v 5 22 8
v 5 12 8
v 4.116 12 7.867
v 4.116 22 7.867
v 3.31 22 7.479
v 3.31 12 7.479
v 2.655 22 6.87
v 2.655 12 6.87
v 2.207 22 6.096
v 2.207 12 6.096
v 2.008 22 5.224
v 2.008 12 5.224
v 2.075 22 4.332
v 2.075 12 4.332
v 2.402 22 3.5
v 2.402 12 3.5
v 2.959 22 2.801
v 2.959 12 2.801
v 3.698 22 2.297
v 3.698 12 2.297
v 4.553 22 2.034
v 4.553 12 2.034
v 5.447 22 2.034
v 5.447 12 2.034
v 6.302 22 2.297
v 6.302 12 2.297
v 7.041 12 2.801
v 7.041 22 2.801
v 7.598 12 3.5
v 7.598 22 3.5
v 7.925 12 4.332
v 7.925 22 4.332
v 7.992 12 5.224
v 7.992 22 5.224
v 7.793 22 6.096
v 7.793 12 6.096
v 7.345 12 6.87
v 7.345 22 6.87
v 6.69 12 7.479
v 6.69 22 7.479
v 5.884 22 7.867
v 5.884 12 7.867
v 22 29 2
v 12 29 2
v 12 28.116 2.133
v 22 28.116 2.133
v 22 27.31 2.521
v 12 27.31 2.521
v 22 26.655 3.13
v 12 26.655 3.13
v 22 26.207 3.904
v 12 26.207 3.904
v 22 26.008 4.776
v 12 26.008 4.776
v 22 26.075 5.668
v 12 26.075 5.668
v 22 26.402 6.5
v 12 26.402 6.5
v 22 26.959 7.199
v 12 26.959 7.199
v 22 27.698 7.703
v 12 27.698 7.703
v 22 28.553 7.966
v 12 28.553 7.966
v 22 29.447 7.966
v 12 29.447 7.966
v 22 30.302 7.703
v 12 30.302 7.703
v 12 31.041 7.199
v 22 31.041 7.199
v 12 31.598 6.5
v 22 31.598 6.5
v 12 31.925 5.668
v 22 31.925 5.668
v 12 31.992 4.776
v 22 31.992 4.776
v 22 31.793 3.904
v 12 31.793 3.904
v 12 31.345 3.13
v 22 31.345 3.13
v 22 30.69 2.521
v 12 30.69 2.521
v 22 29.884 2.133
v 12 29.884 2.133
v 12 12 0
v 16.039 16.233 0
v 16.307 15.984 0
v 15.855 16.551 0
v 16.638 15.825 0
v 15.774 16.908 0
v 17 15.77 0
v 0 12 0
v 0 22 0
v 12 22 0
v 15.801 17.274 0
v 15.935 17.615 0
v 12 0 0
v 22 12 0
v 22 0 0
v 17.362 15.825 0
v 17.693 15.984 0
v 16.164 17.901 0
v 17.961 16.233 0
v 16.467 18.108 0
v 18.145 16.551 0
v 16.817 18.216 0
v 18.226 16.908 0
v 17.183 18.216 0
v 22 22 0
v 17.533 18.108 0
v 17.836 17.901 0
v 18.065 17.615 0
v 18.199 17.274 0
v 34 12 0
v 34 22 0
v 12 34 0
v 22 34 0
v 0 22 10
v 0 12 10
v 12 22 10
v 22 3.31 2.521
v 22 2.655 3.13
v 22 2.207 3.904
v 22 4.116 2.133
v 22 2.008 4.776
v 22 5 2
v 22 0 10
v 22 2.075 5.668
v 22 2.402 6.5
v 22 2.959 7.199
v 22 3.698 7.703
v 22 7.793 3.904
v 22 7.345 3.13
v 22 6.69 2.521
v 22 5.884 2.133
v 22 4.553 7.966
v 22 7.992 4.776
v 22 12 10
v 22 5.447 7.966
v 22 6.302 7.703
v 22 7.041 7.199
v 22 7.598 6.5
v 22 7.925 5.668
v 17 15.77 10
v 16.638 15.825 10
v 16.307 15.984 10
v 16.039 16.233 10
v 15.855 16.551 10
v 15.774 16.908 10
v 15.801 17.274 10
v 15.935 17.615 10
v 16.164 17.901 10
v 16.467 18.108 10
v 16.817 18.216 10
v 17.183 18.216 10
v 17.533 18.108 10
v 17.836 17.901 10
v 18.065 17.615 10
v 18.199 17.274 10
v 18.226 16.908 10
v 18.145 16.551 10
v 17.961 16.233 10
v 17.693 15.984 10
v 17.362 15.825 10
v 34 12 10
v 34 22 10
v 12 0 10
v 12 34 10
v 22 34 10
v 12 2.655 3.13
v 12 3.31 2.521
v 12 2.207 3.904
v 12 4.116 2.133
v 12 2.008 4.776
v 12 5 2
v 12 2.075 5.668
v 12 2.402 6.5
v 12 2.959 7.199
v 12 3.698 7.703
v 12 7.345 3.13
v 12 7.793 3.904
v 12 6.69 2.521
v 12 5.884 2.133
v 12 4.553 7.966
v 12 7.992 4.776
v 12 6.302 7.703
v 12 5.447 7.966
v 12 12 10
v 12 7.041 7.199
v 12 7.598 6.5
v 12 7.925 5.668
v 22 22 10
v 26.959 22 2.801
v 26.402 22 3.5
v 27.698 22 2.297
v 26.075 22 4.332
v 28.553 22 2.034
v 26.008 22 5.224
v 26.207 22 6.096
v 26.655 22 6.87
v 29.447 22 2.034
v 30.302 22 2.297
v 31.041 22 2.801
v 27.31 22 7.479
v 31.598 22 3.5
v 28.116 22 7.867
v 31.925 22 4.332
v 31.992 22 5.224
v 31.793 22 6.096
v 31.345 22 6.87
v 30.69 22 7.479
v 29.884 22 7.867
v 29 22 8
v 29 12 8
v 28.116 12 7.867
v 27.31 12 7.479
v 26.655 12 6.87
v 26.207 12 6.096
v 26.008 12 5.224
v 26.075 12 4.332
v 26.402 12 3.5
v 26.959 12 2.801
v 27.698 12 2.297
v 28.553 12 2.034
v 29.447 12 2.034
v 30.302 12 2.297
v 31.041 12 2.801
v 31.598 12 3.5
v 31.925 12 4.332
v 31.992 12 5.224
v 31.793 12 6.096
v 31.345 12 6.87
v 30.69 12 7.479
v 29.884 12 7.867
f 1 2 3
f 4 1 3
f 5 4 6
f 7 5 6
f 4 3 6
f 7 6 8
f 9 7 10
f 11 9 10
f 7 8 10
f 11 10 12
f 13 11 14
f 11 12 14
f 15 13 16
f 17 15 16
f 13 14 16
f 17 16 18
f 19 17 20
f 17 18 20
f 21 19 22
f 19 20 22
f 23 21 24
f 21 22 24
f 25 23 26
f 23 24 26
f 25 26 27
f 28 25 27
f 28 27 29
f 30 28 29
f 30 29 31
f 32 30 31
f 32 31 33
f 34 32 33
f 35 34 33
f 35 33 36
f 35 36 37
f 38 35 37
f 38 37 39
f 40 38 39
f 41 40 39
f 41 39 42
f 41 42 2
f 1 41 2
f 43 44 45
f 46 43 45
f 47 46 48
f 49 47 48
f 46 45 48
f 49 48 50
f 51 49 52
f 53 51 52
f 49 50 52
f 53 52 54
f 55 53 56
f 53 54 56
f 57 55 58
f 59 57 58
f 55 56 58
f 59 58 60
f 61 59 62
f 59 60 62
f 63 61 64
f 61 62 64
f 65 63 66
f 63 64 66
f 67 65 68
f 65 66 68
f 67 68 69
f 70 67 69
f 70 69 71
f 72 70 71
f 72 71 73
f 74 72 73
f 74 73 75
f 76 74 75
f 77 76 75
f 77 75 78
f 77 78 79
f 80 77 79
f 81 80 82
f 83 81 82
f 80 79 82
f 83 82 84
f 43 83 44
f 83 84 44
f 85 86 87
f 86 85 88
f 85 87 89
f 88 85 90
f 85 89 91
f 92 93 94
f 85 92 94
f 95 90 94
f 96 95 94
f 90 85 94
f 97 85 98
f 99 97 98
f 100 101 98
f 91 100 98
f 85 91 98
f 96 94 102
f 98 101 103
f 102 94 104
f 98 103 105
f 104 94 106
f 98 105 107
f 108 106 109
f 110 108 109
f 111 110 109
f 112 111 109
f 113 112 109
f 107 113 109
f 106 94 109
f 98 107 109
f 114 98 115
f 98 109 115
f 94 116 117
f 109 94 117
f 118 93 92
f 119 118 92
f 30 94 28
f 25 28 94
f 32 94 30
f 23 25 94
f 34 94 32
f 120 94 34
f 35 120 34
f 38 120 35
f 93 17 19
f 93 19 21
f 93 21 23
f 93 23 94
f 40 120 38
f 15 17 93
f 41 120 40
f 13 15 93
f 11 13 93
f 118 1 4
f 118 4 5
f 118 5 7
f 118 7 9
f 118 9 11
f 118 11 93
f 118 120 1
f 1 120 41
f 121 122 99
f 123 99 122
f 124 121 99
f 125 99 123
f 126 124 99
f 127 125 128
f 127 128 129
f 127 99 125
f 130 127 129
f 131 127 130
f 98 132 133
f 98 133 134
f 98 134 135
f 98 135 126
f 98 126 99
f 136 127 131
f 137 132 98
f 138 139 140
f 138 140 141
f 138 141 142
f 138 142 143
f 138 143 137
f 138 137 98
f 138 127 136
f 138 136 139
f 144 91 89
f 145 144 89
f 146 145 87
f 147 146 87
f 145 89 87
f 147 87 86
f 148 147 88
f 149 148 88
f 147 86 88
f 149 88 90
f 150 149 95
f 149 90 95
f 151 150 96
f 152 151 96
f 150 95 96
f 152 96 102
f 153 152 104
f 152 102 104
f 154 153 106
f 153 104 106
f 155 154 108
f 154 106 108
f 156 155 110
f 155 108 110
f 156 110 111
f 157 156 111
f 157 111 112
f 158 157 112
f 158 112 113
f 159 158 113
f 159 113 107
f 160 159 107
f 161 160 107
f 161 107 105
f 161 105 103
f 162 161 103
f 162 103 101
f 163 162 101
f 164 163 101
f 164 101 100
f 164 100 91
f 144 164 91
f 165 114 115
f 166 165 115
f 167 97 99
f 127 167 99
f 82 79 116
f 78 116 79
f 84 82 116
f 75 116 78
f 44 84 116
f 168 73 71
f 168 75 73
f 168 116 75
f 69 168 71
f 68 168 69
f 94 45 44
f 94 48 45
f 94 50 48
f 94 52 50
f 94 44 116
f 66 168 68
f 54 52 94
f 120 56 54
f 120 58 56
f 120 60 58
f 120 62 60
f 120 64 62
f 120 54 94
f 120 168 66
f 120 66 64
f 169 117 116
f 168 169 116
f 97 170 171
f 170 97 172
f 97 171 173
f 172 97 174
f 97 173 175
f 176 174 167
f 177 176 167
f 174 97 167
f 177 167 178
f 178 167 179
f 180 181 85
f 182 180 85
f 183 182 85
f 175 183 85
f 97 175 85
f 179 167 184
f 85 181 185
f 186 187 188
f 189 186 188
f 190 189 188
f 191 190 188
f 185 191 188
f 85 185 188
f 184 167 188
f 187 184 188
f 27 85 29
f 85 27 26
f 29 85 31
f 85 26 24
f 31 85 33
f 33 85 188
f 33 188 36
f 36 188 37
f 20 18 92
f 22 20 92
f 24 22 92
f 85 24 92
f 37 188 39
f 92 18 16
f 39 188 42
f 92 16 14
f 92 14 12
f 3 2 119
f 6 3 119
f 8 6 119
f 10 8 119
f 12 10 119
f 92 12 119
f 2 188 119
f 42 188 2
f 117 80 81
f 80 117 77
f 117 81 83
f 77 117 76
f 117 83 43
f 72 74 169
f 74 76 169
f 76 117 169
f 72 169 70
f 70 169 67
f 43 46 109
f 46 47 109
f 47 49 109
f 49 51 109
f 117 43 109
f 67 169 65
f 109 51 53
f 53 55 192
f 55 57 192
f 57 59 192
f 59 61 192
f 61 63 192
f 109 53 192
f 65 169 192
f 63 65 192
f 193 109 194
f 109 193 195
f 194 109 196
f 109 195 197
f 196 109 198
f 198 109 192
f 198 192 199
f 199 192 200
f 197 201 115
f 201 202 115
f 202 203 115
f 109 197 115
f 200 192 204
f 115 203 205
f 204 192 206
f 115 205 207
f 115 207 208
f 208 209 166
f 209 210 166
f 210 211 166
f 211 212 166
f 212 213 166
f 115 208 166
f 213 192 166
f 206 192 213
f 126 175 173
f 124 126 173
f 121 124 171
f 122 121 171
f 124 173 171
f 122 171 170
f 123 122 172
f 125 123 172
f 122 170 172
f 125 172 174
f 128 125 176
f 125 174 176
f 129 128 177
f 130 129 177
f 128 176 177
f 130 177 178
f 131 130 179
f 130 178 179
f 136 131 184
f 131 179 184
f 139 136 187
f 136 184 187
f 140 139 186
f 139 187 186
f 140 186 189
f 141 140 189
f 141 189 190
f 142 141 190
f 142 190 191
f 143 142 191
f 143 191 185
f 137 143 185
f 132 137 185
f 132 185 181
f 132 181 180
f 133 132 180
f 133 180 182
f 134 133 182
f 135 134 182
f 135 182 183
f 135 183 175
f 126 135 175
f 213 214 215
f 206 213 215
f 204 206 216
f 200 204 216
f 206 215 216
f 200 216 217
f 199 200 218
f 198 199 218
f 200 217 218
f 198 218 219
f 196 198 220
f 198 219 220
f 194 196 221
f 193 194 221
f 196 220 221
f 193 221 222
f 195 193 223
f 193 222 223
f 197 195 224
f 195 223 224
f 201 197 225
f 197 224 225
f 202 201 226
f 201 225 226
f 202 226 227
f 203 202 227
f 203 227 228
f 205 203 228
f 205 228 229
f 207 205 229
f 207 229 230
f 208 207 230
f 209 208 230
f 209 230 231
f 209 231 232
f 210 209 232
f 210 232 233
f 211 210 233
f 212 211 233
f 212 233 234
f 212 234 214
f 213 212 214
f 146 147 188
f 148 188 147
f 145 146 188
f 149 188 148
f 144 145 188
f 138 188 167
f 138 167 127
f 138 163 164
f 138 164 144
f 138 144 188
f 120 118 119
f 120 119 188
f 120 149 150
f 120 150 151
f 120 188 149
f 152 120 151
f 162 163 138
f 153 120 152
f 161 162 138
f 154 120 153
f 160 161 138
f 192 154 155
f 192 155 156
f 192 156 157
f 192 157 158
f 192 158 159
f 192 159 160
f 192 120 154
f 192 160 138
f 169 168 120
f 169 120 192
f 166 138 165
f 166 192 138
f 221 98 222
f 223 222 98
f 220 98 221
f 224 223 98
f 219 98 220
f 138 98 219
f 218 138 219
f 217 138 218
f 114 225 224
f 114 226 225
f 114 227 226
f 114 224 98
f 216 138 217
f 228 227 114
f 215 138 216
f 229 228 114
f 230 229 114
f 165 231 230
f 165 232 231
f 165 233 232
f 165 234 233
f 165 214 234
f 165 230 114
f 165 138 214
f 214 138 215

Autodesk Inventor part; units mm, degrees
ref_plane "YZ Plane" through (0, 0, 0) normal (1, 0, 0) x (0, 1, 0)
ref_plane "XZ Plane" through (0, 0, 0) normal (0, 1, 0) x (-1, 0, 0)
ref_plane "XY Plane" through (0, 0, 0) normal (0, 0, 1) x (1, 0, 0)
sketch "スケッチ1" plane through (0, 0, 0) normal (0, 0, 1) x (1, 0, 0)
  line L0 (0, 0) -> (34, 0)
  line L1 (34, 0) -> (34, 34)
  line L2 (34, 34) -> (0, 34)
  line L3 (0, 34) -> (0, 0)
  dimension "d0" = 34
  dimension "d1" = 34
extrude "押し出し1" add sketch "スケッチ1" along normal blind 10
sketch "スケッチ2" plane through (0, 0, 10) normal (0, 0, 1) x (1, 0, 0)
  line L0 (34, 34) -> (0, 34) projected
  line L1 (34, 34) -> (22, 34)
  line L2 (22, 34) -> (22, 22)
  line L3 (22, 22) -> (34, 22)
  line L4 (34, 22) -> (34, 34)
  point P0 (0, 0)
  point P1 (22, 34)
  dimension "d4" = 12
  dimension "d5" = 12
extrude "押し出し2" cut sketch "スケッチ2" against normal blind 10
sketch "スケッチ3" plane through (0, 0, 10) normal (0, 0, 1) x (1, 0, 0)
  line L0 (0, 34) -> (12, 34)
  line L1 (12, 34) -> (12, 22)
  line L2 (12, 22) -> (0, 22)
  line L3 (0, 22) -> (0, 34)
  line L4 (0, 0) -> (34, 0) projected
  line L5 (0, 0) -> (12, 0)
  line L6 (12, 0) -> (12, 12)
  line L7 (12, 12) -> (0, 12)
  line L8 (0, 12) -> (0, 0)
  line L9 (34, 0) -> (22, 0)
  line L10 (22, 0) -> (22, 12)
  line L11 (22, 12) -> (34, 12)
  line L12 (34, 12) -> (34, 0)
  point P0 (22, 0)
  dimension "d8" = 12
  dimension "d9" = 12
  dimension "d10" = 12
  dimension "d11" = 12
  dimension "d12" = 12
  dimension "d13" = 12
extrude "押し出し3" cut sketch "スケッチ3" against normal blind 10
sketch "スケッチ4" plane through (22, 22, 10) normal (1, 0, 0) x (0, 0, -1)
  line L0 (0, 12) -> (10, 12) projected
  line L1 (10, 12) -> (10, 0) projected
  line L2 (10, -10) -> (10, -22) projected
  line L3 (10, -22) -> (0, -22) projected
  point P0 (5, 7)
  point P1 (5, -17)
  dimension "d16" = 5
  dimension "d17" = 5
  dimension "d18" = 5
  dimension "d19" = 5
hole "穴1" at (22, 29, 5) at (22, 5, 5) direction (-1, 0, 0) diameter 6 end through all
sketch "スケッチ5" plane through (0, 22, 10) normal (0, 1, 0) x (1, 0, 0)
  line L0 (0, 10) -> (12, 10) projected
  line L1 (0, 0) -> (0, 10) projected
  line L2 (22, 10) -> (34, 10) projected
  line L3 (34, 10) -> (34, 0) projected
  point P0 (5, 5)
  point P1 (29, 5)
  dimension "d27" = 5
  dimension "d28" = 5
  dimension "d29" = 5
  dimension "d30" = 5
hole "穴2" at (5, 22, 5) at (29, 22, 5) direction (0, -1, 0) diameter 6 end through all
sketch "スケッチ6" plane through (0, 0, 10) normal (0, 0, 1) x (1, 0, 0)
  line L0 (34, 12) -> (34, 22) projected
  line L1 (22, 34) -> (12, 34) projected
  point P0 (0, 0)
  point P1 (17, 17)
  dimension "d38" = 17
  dimension "d39" = 17
hole "穴3" at (17, 17, 10) direction (0, 0, -1) diameter 2.459 end through all thread size "M3x0.5" class "6H" standard "ISO Metric profile"
properties part number "シリンダ先端パーツ"
